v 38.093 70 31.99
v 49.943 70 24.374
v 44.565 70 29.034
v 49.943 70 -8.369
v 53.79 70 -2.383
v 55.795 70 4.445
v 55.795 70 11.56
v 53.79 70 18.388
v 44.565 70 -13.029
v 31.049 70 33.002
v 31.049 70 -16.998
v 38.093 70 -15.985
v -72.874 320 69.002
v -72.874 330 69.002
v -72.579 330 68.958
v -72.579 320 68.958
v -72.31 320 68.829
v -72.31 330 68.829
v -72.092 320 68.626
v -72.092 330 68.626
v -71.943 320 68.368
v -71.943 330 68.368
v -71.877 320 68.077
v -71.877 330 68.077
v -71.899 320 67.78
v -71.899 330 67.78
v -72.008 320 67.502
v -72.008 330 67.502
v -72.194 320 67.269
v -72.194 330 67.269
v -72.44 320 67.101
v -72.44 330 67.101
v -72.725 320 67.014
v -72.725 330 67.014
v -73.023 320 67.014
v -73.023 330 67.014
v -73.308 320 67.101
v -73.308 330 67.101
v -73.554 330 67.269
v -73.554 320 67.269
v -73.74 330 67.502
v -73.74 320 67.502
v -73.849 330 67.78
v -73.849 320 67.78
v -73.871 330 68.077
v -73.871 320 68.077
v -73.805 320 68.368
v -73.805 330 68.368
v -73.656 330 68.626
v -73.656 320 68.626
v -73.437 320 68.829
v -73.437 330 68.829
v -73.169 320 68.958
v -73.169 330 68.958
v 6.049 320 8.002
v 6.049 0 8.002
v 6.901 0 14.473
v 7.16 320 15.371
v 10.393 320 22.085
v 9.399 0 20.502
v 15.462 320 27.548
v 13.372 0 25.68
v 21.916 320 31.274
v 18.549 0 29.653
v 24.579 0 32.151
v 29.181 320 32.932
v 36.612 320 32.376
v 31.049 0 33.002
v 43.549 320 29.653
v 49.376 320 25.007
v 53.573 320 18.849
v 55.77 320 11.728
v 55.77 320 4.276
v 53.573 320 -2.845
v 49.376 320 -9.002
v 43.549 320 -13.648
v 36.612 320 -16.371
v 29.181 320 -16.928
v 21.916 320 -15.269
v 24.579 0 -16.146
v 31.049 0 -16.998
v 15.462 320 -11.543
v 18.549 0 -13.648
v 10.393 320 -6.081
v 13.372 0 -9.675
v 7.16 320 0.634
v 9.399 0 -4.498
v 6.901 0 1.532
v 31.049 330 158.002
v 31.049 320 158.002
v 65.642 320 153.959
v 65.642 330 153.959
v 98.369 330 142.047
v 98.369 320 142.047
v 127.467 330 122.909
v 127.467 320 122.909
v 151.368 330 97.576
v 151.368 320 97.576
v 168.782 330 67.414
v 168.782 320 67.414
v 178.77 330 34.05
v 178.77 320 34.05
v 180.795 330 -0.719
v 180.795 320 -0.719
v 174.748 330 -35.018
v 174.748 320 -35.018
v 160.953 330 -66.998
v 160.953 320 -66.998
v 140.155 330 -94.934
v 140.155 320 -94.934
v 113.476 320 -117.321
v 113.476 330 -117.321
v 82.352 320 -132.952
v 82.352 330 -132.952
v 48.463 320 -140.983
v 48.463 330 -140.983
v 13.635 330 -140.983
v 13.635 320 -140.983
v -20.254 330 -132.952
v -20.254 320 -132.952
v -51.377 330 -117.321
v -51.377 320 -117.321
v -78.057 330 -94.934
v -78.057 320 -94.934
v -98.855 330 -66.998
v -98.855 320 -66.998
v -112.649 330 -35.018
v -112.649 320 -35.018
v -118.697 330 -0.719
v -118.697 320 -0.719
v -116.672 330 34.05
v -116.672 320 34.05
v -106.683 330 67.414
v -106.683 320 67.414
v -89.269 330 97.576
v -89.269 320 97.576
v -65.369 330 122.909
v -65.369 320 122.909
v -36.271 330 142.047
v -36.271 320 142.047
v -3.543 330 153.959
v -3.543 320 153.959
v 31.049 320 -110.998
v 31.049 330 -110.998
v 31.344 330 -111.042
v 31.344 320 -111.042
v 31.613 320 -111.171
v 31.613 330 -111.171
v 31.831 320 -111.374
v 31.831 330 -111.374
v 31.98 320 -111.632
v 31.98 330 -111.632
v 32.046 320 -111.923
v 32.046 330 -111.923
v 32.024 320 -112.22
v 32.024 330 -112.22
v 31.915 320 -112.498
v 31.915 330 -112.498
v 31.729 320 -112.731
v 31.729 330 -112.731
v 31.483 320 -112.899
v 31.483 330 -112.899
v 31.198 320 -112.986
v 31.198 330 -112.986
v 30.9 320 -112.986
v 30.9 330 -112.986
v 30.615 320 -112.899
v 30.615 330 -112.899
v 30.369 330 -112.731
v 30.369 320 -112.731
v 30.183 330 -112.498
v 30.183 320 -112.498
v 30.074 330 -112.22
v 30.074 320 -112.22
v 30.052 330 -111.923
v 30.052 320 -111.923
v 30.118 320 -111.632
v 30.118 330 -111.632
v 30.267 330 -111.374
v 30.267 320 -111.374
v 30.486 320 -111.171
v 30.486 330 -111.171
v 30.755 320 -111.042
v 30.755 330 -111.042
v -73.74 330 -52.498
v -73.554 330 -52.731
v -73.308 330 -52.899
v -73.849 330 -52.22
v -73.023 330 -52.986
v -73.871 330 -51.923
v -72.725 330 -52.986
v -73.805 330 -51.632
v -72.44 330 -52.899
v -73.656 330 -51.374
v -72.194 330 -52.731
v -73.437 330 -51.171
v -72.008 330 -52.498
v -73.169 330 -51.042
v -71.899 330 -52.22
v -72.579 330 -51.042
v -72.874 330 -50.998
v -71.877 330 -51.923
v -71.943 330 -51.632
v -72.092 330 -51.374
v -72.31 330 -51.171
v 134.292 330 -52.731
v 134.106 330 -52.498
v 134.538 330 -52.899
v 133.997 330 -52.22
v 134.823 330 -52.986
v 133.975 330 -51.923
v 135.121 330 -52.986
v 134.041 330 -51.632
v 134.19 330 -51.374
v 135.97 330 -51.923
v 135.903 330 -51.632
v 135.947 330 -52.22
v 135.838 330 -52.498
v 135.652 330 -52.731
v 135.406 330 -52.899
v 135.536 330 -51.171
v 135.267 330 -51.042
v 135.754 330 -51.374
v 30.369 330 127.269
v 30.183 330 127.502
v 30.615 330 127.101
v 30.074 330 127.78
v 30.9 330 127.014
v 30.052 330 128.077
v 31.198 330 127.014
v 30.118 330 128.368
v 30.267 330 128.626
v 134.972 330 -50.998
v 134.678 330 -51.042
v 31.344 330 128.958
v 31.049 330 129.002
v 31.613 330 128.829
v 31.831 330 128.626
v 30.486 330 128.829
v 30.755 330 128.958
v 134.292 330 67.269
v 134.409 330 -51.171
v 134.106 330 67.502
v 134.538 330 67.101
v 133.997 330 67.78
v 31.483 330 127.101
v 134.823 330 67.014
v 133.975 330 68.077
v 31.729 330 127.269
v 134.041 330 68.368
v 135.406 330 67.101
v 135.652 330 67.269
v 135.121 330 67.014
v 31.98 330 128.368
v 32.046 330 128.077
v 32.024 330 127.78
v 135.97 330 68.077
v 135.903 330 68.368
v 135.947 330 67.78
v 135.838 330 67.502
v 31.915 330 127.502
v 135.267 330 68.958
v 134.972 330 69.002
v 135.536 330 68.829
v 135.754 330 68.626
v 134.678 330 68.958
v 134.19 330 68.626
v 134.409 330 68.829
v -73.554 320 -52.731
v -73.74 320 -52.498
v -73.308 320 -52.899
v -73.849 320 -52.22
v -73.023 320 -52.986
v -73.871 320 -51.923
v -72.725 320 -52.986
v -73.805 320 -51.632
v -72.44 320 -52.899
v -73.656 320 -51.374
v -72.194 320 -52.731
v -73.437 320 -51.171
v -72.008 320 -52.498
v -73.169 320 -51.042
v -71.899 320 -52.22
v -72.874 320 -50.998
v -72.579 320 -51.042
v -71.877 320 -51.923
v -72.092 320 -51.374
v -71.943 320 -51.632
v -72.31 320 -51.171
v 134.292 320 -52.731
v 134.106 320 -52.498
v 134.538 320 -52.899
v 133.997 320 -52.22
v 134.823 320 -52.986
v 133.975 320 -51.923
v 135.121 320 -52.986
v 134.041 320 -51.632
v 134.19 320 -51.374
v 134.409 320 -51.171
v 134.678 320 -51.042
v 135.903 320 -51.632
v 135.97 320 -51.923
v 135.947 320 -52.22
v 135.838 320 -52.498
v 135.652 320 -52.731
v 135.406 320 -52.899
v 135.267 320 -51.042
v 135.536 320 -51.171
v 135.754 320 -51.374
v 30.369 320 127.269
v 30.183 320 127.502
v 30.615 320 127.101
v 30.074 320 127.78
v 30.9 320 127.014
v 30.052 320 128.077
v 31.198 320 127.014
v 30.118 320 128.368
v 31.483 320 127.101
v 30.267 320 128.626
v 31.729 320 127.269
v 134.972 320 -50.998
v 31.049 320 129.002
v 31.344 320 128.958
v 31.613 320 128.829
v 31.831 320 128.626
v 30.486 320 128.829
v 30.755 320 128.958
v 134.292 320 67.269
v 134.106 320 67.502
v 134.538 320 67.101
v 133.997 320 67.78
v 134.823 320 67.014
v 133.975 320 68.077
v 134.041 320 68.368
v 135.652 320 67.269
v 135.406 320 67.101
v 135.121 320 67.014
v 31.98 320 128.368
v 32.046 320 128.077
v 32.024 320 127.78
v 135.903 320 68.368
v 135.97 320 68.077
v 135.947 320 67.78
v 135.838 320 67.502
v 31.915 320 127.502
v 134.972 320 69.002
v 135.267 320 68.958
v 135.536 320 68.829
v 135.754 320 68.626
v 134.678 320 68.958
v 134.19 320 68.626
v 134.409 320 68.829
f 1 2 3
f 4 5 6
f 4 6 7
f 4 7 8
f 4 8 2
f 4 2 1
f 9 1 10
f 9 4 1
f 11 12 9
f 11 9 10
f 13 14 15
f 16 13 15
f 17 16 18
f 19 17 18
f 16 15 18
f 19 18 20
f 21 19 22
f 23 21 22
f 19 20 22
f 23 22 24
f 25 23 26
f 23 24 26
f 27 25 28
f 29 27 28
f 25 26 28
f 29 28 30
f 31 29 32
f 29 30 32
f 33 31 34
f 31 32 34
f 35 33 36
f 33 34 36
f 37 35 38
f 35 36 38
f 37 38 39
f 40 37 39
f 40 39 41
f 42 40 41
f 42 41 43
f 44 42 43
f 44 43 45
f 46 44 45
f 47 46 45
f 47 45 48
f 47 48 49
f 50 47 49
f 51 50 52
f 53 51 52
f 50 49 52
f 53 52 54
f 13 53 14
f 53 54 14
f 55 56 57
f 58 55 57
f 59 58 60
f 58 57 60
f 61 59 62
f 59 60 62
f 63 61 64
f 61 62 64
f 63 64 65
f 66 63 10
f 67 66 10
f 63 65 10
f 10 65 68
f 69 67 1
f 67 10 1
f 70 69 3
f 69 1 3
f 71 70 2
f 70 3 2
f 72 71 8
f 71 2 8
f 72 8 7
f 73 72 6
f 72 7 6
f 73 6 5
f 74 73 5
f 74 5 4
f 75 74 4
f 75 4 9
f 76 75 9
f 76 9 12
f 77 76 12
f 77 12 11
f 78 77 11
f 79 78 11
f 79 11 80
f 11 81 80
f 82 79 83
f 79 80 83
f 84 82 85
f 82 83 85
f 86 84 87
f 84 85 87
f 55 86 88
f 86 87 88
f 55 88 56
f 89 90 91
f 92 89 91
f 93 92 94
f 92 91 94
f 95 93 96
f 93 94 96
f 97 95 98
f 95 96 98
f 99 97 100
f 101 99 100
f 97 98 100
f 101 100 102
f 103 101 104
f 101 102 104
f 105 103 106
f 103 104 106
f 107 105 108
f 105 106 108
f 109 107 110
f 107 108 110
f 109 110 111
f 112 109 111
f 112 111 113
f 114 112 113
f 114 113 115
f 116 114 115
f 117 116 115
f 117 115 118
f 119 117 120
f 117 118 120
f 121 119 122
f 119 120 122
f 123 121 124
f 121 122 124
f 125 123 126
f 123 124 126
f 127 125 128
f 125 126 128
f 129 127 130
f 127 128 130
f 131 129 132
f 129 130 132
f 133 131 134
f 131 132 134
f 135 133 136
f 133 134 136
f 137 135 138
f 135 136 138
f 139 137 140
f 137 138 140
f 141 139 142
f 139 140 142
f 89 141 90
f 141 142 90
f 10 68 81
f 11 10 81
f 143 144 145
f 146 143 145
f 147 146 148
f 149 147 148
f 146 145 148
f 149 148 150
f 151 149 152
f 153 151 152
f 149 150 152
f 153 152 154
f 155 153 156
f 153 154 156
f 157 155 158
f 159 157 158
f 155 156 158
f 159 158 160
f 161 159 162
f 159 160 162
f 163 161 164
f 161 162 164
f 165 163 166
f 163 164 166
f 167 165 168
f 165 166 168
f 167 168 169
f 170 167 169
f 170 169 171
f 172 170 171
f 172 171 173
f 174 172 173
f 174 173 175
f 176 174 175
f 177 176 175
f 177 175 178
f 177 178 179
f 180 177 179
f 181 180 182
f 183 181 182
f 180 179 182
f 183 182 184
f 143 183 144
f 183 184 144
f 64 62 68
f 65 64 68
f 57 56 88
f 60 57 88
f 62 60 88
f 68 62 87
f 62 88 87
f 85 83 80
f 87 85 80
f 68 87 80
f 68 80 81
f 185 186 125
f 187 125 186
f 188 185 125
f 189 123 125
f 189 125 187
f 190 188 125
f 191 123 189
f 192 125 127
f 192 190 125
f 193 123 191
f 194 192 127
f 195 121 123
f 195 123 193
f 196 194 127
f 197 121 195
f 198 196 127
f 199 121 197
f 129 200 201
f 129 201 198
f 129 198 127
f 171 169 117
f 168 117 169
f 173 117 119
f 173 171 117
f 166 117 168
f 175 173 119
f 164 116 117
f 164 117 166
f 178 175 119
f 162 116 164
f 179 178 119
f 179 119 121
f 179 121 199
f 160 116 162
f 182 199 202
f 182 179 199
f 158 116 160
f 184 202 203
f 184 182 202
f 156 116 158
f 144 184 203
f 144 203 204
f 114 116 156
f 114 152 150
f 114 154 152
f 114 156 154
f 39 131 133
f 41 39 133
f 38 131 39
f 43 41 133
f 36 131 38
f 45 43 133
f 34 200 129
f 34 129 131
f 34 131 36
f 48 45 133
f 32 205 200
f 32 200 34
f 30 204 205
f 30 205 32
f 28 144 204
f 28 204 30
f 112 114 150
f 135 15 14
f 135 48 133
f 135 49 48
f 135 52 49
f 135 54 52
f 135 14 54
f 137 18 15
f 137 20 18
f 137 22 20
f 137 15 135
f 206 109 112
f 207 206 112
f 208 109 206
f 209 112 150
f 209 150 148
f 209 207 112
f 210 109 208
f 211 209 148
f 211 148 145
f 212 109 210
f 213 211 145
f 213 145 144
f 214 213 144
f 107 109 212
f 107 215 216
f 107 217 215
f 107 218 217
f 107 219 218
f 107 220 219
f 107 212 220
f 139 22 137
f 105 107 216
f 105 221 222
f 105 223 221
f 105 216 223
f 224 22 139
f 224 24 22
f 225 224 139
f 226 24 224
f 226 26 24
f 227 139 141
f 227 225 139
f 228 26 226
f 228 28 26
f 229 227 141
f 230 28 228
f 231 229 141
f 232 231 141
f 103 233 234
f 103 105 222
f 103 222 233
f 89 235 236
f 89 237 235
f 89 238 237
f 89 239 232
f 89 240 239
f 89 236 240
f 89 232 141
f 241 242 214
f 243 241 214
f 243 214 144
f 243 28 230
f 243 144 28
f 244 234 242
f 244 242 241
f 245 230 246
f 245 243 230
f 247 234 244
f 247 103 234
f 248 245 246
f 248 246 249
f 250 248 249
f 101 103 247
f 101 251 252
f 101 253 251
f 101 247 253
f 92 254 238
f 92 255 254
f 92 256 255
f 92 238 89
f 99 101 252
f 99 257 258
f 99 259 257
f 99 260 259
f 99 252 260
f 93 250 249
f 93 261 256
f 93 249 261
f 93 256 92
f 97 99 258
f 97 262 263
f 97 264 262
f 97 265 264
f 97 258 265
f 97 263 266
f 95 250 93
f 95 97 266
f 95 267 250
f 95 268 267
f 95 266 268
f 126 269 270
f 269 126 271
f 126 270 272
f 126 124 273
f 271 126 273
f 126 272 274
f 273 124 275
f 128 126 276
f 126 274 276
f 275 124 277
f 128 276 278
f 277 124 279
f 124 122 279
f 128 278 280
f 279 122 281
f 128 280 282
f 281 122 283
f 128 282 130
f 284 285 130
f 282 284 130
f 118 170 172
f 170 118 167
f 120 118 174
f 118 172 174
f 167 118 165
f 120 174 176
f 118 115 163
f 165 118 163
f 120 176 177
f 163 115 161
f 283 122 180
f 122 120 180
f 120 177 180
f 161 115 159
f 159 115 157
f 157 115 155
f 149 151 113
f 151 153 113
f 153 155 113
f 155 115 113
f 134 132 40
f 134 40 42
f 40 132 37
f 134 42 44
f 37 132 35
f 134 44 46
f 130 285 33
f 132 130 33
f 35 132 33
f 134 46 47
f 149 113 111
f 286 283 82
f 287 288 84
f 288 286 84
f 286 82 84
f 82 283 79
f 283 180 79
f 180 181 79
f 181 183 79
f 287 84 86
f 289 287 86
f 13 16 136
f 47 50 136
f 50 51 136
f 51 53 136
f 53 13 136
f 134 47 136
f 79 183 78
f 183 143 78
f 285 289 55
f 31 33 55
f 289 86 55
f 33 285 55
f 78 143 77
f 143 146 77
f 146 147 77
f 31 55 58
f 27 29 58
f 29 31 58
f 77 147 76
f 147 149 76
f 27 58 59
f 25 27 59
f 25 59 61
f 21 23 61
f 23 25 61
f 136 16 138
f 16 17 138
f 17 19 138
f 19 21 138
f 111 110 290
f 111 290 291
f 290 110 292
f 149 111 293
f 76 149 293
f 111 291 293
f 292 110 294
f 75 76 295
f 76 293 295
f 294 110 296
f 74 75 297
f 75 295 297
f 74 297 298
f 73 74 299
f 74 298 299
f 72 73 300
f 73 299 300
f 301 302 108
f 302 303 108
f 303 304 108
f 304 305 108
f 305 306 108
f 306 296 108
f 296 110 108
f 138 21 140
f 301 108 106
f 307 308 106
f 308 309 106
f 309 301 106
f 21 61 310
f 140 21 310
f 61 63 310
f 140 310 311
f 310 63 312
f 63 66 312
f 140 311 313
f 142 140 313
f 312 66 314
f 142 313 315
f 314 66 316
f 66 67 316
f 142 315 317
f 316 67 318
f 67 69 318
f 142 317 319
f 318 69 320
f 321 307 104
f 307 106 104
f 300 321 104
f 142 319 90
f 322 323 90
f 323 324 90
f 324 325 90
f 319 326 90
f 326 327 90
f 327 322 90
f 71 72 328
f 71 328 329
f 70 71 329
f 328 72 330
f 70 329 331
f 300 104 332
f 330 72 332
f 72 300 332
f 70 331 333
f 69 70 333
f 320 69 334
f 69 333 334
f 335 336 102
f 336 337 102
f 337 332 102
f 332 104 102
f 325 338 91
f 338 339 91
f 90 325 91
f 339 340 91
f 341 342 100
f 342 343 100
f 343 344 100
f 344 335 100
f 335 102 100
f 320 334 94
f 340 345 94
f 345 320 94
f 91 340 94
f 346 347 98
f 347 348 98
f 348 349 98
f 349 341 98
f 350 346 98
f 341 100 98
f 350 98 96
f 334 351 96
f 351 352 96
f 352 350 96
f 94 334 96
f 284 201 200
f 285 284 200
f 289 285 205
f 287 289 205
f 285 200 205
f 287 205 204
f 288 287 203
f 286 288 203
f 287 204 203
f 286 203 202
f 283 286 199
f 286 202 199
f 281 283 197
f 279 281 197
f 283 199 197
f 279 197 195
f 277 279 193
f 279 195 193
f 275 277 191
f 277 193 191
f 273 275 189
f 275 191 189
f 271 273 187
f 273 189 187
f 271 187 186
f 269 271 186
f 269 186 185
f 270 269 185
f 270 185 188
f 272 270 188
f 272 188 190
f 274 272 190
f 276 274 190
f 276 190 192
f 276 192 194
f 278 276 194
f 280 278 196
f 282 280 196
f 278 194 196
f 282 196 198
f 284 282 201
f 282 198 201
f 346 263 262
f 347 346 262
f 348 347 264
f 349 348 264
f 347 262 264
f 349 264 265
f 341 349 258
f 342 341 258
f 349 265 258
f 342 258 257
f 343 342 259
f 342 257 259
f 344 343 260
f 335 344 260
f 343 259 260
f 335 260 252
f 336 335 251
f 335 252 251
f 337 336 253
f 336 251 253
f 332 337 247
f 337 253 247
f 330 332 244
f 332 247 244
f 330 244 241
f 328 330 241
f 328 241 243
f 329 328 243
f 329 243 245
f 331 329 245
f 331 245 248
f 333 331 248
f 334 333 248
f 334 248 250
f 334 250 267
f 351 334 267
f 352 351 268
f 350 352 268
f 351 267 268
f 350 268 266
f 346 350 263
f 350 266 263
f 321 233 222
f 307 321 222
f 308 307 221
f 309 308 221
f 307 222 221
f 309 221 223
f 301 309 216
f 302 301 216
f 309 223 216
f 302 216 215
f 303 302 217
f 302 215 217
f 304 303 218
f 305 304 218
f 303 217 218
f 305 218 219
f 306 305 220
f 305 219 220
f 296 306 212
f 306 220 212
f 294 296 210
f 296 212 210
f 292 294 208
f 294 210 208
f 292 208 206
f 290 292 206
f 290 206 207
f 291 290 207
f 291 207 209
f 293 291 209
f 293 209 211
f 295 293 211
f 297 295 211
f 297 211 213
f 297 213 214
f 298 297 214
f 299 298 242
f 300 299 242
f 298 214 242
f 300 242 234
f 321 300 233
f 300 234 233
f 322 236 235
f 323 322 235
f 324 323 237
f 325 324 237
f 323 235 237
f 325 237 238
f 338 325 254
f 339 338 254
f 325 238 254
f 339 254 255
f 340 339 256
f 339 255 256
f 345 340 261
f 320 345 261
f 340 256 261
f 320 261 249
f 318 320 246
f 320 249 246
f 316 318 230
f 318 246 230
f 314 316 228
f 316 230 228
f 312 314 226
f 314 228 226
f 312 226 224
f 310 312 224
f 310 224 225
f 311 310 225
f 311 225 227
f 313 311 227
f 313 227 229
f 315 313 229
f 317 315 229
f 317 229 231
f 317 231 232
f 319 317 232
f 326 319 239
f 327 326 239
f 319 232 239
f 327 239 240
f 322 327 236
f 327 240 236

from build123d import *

# Parameters (mm, degrees)
BOSS_EXTRU_1_DEPTH      = 320
ENL_V_MAT_EXTRU_1_DEPTH = 70
ESQUISSE3_R             = 150
BOSS_EXTRU_2_DEPTH      = 10
ESQUISSE4_R             = 1
ENL_V_MAT_EXTRU_2_DEPTH = 10


with BuildPart() as part:
    # Esquisse1 → Boss.-Extru.1 (new body)
    with BuildSketch(Plane(origin=(0, 0, 0), x_dir=(1, 0, 0), z_dir=(0, 1, 0))):
        with BuildLine():
            ThreePointArc((56.049273334, -8.002390035), (31.049273334, 16.997609965), (6.049273334, -8.002390035))
            Line((6.049273334, -8.002390035), (56.049273334, -8.002390035))
        make_face()
        with BuildLine():
            Line((56.049273334, -8.002390035), (6.049273334, -8.002390035))
            ThreePointArc((6.049273334, -8.002390035), (31.049273334, -33.002390035), (56.049273334, -8.002390035))
        make_face()
    extrude(amount=BOSS_EXTRU_1_DEPTH)

    # Esquisse2 → Enlèv. mat.-Extru.1 (cut)
    with BuildSketch(Plane(origin=(0, 0, 0), x_dir=(-1, 0, 0), z_dir=(0, -1, 0))):
        with BuildLine():
            Line((-31.049273334, -33.002390035), (-31.049273334, 16.997609965))
            ThreePointArc((-31.049273334, 16.997609965), (-56.049273334, -8.002390035), (-31.049273334, -33.002390035))
        make_face()
    extrude(amount=-ENL_V_MAT_EXTRU_1_DEPTH, mode=Mode.SUBTRACT)

    # Esquisse3 → Boss.-Extru.2 (add)
    with BuildSketch(Plane(origin=(0, 320, 0), x_dir=(1, 0, 0), z_dir=(0, 1, 0))):
        with Locations(Location((31.049273334, -8.002390035, 0), (0, 0, 270))):
            Circle(ESQUISSE3_R)
    extrude(amount=BOSS_EXTRU_2_DEPTH)

    # Esquisse4 → Enlèv. mat.-Extru.2 (cut)
    with BuildSketch(Plane(origin=(0, 330, 0), x_dir=(1, 0, 0), z_dir=(0, 1, 0))):
        with Locations(Location((-72.87377512, -68.002390035, 0), (0, 0, 270))):
            Circle(ESQUISSE4_R)
        with Locations(Location((-72.87377512, 51.997609965, 0), (0, 0, 270))):
            Circle(ESQUISSE4_R)
        with Locations(Location((31.049273334, 111.997609965, 0), (0, 0, 270))):
            Circle(ESQUISSE4_R)
        with Locations(Location((134.972321788, 51.997609965, 0), (0, 0, 270))):
            Circle(ESQUISSE4_R)
        with Locations(Location((134.972321788, -68.002390035, 0), (0, 0, 270))):
            Circle(ESQUISSE4_R)
        with Locations(Location((31.049273334, -128.002390035, 0), (0, 0, 270))):
            Circle(ESQUISSE4_R)
    extrude(amount=-ENL_V_MAT_EXTRU_2_DEPTH, mode=Mode.SUBTRACT)


solid = part.part
